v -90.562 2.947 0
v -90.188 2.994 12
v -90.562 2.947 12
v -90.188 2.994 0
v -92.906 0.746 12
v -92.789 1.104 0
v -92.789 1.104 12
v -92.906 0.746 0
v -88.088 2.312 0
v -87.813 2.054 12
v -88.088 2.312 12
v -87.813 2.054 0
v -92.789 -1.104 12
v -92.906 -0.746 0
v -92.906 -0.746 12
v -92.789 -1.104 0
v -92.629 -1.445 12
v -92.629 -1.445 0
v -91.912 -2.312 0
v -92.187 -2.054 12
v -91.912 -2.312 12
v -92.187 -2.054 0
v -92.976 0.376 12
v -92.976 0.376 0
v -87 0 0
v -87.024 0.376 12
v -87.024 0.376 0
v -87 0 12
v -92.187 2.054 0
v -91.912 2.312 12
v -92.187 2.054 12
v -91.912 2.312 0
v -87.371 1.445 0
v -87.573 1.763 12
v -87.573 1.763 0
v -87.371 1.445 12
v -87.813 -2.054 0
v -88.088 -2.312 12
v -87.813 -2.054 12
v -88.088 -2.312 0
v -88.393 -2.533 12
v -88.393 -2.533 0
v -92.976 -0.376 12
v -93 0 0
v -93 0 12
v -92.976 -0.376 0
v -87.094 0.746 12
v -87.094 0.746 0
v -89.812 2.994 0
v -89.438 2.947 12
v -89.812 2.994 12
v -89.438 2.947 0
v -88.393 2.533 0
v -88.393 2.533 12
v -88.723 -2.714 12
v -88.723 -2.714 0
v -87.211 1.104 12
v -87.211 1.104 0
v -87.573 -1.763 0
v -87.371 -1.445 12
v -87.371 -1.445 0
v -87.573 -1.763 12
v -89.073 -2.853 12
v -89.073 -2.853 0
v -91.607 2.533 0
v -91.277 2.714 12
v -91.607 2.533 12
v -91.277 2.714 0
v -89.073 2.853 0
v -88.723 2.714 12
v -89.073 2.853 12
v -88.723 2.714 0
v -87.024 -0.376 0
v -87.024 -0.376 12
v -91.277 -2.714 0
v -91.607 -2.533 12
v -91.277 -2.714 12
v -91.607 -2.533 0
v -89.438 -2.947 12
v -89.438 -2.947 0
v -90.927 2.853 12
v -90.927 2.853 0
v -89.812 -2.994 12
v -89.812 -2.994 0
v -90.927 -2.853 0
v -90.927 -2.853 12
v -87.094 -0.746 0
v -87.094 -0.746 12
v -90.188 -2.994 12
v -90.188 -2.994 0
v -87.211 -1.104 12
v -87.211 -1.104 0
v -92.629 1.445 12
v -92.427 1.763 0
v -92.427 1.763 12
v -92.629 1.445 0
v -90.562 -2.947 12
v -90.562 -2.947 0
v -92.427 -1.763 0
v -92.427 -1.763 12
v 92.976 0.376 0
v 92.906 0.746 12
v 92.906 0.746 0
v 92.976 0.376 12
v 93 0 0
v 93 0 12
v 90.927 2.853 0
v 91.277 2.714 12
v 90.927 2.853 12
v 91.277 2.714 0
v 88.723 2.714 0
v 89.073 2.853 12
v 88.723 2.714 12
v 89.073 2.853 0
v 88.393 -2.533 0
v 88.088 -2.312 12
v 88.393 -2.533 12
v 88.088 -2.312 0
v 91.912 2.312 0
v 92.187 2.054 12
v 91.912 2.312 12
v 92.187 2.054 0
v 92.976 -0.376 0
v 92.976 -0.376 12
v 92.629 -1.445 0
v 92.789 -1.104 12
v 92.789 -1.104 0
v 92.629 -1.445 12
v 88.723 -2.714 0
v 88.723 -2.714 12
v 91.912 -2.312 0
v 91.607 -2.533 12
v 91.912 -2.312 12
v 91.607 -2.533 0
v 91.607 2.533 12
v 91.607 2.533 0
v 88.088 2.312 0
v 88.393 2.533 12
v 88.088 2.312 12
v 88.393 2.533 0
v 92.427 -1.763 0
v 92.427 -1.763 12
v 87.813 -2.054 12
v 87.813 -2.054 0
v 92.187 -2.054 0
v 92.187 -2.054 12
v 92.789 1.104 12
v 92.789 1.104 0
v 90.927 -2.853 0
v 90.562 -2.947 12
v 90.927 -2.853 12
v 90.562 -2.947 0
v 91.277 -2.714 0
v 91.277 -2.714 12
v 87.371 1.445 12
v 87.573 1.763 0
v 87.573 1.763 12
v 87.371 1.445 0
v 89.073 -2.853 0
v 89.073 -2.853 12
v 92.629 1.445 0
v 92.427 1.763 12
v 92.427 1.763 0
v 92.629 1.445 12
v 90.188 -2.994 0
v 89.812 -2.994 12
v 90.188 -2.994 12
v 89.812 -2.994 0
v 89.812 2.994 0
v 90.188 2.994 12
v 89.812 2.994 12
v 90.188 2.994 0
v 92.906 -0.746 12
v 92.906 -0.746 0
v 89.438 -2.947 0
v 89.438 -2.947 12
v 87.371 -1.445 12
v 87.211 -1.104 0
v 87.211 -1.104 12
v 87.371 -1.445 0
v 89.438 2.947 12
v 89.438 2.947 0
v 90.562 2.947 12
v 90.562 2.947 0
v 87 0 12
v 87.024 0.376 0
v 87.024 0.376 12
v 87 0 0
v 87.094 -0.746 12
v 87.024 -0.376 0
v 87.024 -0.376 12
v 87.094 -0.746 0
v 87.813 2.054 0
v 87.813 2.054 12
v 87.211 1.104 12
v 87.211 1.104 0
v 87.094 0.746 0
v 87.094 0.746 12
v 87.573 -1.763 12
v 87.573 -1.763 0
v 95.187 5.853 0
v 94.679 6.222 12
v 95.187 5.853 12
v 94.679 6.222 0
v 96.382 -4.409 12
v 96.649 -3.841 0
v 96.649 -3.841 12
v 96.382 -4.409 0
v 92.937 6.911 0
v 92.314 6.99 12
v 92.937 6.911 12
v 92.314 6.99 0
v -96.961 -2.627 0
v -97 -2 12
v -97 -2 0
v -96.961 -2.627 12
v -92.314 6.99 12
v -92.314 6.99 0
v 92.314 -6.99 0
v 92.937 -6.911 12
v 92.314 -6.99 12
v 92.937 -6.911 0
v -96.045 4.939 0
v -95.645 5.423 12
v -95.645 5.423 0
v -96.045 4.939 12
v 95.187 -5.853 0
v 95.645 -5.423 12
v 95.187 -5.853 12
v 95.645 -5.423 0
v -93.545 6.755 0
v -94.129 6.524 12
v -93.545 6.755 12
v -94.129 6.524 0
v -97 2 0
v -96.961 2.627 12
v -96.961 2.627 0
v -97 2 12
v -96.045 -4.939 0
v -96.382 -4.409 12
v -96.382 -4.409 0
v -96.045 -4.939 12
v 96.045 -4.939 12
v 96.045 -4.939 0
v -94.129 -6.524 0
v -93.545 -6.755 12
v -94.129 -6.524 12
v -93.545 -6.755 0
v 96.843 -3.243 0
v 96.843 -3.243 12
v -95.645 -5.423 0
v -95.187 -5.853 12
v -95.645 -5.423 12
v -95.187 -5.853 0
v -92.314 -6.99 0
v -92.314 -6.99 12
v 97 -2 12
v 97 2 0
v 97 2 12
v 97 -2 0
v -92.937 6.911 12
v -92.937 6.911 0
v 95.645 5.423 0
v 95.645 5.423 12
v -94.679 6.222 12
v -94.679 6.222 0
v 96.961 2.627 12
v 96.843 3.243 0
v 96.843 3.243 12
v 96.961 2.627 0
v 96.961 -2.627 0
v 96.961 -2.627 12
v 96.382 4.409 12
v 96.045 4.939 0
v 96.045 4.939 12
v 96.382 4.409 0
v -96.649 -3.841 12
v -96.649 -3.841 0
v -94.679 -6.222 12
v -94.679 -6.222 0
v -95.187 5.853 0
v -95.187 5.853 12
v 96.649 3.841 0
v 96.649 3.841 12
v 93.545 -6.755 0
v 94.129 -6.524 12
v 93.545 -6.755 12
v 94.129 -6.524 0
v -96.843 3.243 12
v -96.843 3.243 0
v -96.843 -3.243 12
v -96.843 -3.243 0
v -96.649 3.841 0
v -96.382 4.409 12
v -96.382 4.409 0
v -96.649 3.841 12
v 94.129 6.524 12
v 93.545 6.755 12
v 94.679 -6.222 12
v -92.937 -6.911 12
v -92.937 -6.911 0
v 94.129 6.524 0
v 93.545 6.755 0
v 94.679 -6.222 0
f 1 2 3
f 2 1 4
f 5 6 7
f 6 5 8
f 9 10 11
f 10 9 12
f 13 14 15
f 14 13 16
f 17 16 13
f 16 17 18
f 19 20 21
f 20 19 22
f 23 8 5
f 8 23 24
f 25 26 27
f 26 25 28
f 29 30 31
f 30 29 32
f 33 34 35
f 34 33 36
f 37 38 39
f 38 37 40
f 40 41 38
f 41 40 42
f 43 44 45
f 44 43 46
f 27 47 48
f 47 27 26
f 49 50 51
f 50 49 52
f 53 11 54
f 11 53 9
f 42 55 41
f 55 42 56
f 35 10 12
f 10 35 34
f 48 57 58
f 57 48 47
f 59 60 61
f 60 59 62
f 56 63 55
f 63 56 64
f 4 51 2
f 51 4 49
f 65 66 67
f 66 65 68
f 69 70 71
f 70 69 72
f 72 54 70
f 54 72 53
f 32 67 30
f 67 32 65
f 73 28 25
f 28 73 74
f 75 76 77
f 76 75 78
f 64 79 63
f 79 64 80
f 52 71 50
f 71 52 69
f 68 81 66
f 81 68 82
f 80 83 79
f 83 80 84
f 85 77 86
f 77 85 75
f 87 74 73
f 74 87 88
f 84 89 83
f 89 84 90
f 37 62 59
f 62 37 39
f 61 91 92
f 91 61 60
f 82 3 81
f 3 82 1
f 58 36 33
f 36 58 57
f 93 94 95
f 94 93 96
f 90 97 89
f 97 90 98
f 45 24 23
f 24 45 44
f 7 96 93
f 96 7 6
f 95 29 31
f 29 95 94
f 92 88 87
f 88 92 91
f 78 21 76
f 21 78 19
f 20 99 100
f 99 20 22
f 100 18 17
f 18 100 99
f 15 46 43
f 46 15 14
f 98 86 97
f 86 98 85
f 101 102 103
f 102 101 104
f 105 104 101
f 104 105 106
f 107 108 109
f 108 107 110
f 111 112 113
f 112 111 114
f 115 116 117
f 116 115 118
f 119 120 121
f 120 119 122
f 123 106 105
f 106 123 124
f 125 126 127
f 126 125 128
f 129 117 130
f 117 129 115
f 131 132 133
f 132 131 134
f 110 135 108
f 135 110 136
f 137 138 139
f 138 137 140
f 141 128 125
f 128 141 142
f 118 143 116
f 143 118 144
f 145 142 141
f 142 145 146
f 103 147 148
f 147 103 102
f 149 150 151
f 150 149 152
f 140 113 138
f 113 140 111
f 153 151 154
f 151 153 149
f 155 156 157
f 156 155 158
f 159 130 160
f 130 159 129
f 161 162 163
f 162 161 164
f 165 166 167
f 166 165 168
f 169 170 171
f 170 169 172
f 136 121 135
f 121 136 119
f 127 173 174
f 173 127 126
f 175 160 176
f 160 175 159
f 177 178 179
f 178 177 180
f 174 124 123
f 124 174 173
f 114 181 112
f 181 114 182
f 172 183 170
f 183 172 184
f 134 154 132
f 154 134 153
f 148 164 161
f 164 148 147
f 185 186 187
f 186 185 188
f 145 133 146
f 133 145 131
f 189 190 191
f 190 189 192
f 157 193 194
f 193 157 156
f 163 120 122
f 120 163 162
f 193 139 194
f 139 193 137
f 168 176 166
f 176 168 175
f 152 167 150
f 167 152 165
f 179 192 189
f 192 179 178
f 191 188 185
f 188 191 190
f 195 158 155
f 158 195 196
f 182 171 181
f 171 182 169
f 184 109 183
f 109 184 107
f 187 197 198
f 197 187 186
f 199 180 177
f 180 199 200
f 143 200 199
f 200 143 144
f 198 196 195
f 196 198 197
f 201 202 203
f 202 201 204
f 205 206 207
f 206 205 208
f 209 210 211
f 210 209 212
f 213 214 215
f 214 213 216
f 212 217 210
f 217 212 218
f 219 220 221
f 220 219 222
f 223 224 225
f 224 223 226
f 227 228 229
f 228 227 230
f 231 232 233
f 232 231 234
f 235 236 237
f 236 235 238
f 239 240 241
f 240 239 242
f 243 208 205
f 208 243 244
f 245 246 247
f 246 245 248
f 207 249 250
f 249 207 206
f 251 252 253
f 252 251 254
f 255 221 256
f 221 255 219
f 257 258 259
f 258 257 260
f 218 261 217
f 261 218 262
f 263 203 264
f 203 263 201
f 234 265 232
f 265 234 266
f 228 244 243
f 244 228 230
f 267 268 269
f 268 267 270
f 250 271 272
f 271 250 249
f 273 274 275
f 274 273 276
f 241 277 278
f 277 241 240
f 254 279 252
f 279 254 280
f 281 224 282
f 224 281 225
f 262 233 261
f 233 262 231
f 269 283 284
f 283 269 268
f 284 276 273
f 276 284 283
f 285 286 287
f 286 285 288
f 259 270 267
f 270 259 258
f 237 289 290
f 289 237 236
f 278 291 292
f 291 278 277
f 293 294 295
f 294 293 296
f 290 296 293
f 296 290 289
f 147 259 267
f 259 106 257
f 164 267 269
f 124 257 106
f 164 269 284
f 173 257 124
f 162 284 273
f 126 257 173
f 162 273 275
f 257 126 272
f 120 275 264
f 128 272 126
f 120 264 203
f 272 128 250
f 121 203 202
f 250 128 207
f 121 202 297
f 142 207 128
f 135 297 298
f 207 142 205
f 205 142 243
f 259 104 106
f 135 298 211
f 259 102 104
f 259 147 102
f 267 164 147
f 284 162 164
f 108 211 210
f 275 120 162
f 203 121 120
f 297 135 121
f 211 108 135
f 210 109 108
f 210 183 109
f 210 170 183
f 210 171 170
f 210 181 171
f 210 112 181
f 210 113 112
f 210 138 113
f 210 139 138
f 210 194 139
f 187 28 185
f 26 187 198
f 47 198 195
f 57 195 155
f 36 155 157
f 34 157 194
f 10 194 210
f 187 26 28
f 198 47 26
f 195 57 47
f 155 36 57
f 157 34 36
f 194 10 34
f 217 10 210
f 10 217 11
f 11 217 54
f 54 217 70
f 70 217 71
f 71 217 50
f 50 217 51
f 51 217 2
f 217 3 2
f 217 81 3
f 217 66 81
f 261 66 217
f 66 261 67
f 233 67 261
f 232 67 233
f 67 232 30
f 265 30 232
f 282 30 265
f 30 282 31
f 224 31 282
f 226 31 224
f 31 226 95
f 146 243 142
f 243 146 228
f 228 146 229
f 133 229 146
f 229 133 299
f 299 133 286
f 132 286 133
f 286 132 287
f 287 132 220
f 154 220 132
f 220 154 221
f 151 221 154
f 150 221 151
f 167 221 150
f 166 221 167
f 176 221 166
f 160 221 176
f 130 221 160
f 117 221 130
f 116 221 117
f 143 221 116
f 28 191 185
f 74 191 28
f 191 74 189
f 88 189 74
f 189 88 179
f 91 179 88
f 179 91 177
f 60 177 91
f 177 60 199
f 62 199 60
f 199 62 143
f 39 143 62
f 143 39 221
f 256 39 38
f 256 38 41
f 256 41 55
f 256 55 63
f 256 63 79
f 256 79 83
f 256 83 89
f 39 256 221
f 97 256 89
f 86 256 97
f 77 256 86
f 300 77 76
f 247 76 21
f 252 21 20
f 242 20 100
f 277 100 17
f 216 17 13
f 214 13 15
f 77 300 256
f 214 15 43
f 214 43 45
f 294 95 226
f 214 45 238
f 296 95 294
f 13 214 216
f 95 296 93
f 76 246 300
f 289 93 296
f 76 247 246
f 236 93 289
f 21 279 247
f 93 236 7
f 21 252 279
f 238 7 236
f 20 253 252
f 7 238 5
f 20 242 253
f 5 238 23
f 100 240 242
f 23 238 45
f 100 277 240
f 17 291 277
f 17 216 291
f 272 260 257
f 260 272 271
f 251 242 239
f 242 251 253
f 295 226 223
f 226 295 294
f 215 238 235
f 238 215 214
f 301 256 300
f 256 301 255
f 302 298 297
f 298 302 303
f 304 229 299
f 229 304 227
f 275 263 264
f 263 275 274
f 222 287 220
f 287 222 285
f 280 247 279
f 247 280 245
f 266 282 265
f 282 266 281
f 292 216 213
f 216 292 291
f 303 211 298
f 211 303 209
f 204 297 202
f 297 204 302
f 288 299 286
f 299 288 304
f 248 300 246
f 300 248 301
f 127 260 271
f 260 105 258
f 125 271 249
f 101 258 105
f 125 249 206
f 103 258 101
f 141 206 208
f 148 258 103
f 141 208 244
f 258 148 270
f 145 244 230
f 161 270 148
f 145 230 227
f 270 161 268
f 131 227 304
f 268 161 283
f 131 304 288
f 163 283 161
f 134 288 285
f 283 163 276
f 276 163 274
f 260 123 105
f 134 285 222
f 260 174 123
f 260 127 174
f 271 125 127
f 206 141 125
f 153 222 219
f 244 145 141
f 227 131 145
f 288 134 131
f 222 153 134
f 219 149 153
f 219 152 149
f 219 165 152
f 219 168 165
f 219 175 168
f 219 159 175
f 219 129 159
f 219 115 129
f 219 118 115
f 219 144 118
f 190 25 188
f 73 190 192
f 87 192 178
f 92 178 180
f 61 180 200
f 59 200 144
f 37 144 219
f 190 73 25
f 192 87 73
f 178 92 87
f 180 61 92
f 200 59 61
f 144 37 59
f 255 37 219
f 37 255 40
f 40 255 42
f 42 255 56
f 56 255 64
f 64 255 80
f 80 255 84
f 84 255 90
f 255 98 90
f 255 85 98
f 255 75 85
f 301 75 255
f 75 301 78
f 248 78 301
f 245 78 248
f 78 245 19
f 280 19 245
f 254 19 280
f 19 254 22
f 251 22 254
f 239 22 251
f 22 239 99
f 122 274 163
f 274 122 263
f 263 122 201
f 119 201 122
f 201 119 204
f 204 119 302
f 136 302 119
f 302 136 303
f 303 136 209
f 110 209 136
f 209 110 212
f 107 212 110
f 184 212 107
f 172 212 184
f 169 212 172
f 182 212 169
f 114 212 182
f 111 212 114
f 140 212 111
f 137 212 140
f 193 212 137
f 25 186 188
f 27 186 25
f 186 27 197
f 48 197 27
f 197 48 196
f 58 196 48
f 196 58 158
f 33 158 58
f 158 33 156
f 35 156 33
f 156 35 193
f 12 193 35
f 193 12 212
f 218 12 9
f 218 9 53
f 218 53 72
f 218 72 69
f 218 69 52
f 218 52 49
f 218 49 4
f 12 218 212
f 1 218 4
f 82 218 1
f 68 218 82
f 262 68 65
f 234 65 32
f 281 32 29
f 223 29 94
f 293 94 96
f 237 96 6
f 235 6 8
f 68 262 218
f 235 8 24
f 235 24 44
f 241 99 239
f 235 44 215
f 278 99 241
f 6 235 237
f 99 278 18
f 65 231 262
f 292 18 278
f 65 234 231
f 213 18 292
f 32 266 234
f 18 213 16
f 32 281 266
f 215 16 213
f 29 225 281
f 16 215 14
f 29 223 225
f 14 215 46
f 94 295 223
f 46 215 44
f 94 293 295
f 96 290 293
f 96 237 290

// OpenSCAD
$fn = 50;


difference() {
	union() {
		hull() {
			translate(v = [-92.0000000000, 2.0000000000, 0]) {
				cylinder(h = 12, r = 5);
			}
			translate(v = [92.0000000000, 2.0000000000, 0]) {
				cylinder(h = 12, r = 5);
			}
			translate(v = [-92.0000000000, -2.0000000000, 0]) {
				cylinder(h = 12, r = 5);
			}
			translate(v = [92.0000000000, -2.0000000000, 0]) {
				cylinder(h = 12, r = 5);
			}
		}
	}
	union() {
		translate(v = [-90.0000000000, 0.0000000000, -100.0000000000]) {
			cylinder(h = 200, r = 3.0000000000);
		}
		translate(v = [-90.0000000000, 0.0000000000, -100.0000000000]) {
			cylinder(h = 200, r = 3.0000000000);
		}
		translate(v = [90.0000000000, 0.0000000000, -100.0000000000]) {
			cylinder(h = 200, r = 3.0000000000);
		}
		translate(v = [90.0000000000, 0.0000000000, -100.0000000000]) {
			cylinder(h = 200, r = 3.0000000000);
		}
	}
}
